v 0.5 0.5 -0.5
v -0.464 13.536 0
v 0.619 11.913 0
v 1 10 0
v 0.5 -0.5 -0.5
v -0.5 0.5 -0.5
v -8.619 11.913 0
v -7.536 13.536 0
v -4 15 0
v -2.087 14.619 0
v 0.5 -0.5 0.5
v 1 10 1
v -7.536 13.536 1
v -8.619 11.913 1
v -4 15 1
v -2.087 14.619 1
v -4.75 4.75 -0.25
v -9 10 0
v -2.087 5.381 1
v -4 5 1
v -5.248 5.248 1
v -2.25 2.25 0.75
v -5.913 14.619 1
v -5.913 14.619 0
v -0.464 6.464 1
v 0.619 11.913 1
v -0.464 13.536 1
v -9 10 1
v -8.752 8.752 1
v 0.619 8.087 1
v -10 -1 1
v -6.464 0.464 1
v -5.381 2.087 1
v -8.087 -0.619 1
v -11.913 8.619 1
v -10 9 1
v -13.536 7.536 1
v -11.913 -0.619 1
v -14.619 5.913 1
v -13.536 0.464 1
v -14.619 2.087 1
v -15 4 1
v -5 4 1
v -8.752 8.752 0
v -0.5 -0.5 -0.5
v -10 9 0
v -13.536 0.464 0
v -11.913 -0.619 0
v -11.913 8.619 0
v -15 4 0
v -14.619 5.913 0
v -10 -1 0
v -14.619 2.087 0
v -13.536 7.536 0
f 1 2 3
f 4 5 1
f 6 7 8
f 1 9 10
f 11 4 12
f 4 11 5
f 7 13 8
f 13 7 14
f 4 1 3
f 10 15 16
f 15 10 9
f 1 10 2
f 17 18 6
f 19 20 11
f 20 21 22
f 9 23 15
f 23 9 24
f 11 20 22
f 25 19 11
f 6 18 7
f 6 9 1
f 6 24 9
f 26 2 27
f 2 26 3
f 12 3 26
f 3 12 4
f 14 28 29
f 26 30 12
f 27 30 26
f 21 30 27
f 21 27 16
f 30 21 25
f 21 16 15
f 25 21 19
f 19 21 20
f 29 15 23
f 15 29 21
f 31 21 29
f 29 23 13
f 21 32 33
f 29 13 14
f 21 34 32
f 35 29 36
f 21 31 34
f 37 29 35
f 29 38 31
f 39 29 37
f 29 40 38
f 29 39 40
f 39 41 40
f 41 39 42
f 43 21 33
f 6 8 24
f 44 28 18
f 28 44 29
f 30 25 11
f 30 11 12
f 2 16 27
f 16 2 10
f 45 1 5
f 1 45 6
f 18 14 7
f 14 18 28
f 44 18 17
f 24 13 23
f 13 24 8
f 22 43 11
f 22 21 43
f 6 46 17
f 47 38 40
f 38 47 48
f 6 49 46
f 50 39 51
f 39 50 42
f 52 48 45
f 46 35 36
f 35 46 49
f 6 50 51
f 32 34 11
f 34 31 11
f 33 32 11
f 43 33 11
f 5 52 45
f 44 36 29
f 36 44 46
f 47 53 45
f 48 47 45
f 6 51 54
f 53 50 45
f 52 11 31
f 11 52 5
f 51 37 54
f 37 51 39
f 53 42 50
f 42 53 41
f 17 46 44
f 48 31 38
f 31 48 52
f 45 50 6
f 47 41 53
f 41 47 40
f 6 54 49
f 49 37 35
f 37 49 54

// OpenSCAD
hull() {
  translate([-4, 10, 0]) {
    cylinder(r=5, h=1);
  }  
  cube(size=[1, 1, 1], center=true);
}

hull() {
  translate([-10, 4, 0]) {
    cylinder(r=5, h=1);
  }
  cube(size=[1, 1, 1], center=true);
}
